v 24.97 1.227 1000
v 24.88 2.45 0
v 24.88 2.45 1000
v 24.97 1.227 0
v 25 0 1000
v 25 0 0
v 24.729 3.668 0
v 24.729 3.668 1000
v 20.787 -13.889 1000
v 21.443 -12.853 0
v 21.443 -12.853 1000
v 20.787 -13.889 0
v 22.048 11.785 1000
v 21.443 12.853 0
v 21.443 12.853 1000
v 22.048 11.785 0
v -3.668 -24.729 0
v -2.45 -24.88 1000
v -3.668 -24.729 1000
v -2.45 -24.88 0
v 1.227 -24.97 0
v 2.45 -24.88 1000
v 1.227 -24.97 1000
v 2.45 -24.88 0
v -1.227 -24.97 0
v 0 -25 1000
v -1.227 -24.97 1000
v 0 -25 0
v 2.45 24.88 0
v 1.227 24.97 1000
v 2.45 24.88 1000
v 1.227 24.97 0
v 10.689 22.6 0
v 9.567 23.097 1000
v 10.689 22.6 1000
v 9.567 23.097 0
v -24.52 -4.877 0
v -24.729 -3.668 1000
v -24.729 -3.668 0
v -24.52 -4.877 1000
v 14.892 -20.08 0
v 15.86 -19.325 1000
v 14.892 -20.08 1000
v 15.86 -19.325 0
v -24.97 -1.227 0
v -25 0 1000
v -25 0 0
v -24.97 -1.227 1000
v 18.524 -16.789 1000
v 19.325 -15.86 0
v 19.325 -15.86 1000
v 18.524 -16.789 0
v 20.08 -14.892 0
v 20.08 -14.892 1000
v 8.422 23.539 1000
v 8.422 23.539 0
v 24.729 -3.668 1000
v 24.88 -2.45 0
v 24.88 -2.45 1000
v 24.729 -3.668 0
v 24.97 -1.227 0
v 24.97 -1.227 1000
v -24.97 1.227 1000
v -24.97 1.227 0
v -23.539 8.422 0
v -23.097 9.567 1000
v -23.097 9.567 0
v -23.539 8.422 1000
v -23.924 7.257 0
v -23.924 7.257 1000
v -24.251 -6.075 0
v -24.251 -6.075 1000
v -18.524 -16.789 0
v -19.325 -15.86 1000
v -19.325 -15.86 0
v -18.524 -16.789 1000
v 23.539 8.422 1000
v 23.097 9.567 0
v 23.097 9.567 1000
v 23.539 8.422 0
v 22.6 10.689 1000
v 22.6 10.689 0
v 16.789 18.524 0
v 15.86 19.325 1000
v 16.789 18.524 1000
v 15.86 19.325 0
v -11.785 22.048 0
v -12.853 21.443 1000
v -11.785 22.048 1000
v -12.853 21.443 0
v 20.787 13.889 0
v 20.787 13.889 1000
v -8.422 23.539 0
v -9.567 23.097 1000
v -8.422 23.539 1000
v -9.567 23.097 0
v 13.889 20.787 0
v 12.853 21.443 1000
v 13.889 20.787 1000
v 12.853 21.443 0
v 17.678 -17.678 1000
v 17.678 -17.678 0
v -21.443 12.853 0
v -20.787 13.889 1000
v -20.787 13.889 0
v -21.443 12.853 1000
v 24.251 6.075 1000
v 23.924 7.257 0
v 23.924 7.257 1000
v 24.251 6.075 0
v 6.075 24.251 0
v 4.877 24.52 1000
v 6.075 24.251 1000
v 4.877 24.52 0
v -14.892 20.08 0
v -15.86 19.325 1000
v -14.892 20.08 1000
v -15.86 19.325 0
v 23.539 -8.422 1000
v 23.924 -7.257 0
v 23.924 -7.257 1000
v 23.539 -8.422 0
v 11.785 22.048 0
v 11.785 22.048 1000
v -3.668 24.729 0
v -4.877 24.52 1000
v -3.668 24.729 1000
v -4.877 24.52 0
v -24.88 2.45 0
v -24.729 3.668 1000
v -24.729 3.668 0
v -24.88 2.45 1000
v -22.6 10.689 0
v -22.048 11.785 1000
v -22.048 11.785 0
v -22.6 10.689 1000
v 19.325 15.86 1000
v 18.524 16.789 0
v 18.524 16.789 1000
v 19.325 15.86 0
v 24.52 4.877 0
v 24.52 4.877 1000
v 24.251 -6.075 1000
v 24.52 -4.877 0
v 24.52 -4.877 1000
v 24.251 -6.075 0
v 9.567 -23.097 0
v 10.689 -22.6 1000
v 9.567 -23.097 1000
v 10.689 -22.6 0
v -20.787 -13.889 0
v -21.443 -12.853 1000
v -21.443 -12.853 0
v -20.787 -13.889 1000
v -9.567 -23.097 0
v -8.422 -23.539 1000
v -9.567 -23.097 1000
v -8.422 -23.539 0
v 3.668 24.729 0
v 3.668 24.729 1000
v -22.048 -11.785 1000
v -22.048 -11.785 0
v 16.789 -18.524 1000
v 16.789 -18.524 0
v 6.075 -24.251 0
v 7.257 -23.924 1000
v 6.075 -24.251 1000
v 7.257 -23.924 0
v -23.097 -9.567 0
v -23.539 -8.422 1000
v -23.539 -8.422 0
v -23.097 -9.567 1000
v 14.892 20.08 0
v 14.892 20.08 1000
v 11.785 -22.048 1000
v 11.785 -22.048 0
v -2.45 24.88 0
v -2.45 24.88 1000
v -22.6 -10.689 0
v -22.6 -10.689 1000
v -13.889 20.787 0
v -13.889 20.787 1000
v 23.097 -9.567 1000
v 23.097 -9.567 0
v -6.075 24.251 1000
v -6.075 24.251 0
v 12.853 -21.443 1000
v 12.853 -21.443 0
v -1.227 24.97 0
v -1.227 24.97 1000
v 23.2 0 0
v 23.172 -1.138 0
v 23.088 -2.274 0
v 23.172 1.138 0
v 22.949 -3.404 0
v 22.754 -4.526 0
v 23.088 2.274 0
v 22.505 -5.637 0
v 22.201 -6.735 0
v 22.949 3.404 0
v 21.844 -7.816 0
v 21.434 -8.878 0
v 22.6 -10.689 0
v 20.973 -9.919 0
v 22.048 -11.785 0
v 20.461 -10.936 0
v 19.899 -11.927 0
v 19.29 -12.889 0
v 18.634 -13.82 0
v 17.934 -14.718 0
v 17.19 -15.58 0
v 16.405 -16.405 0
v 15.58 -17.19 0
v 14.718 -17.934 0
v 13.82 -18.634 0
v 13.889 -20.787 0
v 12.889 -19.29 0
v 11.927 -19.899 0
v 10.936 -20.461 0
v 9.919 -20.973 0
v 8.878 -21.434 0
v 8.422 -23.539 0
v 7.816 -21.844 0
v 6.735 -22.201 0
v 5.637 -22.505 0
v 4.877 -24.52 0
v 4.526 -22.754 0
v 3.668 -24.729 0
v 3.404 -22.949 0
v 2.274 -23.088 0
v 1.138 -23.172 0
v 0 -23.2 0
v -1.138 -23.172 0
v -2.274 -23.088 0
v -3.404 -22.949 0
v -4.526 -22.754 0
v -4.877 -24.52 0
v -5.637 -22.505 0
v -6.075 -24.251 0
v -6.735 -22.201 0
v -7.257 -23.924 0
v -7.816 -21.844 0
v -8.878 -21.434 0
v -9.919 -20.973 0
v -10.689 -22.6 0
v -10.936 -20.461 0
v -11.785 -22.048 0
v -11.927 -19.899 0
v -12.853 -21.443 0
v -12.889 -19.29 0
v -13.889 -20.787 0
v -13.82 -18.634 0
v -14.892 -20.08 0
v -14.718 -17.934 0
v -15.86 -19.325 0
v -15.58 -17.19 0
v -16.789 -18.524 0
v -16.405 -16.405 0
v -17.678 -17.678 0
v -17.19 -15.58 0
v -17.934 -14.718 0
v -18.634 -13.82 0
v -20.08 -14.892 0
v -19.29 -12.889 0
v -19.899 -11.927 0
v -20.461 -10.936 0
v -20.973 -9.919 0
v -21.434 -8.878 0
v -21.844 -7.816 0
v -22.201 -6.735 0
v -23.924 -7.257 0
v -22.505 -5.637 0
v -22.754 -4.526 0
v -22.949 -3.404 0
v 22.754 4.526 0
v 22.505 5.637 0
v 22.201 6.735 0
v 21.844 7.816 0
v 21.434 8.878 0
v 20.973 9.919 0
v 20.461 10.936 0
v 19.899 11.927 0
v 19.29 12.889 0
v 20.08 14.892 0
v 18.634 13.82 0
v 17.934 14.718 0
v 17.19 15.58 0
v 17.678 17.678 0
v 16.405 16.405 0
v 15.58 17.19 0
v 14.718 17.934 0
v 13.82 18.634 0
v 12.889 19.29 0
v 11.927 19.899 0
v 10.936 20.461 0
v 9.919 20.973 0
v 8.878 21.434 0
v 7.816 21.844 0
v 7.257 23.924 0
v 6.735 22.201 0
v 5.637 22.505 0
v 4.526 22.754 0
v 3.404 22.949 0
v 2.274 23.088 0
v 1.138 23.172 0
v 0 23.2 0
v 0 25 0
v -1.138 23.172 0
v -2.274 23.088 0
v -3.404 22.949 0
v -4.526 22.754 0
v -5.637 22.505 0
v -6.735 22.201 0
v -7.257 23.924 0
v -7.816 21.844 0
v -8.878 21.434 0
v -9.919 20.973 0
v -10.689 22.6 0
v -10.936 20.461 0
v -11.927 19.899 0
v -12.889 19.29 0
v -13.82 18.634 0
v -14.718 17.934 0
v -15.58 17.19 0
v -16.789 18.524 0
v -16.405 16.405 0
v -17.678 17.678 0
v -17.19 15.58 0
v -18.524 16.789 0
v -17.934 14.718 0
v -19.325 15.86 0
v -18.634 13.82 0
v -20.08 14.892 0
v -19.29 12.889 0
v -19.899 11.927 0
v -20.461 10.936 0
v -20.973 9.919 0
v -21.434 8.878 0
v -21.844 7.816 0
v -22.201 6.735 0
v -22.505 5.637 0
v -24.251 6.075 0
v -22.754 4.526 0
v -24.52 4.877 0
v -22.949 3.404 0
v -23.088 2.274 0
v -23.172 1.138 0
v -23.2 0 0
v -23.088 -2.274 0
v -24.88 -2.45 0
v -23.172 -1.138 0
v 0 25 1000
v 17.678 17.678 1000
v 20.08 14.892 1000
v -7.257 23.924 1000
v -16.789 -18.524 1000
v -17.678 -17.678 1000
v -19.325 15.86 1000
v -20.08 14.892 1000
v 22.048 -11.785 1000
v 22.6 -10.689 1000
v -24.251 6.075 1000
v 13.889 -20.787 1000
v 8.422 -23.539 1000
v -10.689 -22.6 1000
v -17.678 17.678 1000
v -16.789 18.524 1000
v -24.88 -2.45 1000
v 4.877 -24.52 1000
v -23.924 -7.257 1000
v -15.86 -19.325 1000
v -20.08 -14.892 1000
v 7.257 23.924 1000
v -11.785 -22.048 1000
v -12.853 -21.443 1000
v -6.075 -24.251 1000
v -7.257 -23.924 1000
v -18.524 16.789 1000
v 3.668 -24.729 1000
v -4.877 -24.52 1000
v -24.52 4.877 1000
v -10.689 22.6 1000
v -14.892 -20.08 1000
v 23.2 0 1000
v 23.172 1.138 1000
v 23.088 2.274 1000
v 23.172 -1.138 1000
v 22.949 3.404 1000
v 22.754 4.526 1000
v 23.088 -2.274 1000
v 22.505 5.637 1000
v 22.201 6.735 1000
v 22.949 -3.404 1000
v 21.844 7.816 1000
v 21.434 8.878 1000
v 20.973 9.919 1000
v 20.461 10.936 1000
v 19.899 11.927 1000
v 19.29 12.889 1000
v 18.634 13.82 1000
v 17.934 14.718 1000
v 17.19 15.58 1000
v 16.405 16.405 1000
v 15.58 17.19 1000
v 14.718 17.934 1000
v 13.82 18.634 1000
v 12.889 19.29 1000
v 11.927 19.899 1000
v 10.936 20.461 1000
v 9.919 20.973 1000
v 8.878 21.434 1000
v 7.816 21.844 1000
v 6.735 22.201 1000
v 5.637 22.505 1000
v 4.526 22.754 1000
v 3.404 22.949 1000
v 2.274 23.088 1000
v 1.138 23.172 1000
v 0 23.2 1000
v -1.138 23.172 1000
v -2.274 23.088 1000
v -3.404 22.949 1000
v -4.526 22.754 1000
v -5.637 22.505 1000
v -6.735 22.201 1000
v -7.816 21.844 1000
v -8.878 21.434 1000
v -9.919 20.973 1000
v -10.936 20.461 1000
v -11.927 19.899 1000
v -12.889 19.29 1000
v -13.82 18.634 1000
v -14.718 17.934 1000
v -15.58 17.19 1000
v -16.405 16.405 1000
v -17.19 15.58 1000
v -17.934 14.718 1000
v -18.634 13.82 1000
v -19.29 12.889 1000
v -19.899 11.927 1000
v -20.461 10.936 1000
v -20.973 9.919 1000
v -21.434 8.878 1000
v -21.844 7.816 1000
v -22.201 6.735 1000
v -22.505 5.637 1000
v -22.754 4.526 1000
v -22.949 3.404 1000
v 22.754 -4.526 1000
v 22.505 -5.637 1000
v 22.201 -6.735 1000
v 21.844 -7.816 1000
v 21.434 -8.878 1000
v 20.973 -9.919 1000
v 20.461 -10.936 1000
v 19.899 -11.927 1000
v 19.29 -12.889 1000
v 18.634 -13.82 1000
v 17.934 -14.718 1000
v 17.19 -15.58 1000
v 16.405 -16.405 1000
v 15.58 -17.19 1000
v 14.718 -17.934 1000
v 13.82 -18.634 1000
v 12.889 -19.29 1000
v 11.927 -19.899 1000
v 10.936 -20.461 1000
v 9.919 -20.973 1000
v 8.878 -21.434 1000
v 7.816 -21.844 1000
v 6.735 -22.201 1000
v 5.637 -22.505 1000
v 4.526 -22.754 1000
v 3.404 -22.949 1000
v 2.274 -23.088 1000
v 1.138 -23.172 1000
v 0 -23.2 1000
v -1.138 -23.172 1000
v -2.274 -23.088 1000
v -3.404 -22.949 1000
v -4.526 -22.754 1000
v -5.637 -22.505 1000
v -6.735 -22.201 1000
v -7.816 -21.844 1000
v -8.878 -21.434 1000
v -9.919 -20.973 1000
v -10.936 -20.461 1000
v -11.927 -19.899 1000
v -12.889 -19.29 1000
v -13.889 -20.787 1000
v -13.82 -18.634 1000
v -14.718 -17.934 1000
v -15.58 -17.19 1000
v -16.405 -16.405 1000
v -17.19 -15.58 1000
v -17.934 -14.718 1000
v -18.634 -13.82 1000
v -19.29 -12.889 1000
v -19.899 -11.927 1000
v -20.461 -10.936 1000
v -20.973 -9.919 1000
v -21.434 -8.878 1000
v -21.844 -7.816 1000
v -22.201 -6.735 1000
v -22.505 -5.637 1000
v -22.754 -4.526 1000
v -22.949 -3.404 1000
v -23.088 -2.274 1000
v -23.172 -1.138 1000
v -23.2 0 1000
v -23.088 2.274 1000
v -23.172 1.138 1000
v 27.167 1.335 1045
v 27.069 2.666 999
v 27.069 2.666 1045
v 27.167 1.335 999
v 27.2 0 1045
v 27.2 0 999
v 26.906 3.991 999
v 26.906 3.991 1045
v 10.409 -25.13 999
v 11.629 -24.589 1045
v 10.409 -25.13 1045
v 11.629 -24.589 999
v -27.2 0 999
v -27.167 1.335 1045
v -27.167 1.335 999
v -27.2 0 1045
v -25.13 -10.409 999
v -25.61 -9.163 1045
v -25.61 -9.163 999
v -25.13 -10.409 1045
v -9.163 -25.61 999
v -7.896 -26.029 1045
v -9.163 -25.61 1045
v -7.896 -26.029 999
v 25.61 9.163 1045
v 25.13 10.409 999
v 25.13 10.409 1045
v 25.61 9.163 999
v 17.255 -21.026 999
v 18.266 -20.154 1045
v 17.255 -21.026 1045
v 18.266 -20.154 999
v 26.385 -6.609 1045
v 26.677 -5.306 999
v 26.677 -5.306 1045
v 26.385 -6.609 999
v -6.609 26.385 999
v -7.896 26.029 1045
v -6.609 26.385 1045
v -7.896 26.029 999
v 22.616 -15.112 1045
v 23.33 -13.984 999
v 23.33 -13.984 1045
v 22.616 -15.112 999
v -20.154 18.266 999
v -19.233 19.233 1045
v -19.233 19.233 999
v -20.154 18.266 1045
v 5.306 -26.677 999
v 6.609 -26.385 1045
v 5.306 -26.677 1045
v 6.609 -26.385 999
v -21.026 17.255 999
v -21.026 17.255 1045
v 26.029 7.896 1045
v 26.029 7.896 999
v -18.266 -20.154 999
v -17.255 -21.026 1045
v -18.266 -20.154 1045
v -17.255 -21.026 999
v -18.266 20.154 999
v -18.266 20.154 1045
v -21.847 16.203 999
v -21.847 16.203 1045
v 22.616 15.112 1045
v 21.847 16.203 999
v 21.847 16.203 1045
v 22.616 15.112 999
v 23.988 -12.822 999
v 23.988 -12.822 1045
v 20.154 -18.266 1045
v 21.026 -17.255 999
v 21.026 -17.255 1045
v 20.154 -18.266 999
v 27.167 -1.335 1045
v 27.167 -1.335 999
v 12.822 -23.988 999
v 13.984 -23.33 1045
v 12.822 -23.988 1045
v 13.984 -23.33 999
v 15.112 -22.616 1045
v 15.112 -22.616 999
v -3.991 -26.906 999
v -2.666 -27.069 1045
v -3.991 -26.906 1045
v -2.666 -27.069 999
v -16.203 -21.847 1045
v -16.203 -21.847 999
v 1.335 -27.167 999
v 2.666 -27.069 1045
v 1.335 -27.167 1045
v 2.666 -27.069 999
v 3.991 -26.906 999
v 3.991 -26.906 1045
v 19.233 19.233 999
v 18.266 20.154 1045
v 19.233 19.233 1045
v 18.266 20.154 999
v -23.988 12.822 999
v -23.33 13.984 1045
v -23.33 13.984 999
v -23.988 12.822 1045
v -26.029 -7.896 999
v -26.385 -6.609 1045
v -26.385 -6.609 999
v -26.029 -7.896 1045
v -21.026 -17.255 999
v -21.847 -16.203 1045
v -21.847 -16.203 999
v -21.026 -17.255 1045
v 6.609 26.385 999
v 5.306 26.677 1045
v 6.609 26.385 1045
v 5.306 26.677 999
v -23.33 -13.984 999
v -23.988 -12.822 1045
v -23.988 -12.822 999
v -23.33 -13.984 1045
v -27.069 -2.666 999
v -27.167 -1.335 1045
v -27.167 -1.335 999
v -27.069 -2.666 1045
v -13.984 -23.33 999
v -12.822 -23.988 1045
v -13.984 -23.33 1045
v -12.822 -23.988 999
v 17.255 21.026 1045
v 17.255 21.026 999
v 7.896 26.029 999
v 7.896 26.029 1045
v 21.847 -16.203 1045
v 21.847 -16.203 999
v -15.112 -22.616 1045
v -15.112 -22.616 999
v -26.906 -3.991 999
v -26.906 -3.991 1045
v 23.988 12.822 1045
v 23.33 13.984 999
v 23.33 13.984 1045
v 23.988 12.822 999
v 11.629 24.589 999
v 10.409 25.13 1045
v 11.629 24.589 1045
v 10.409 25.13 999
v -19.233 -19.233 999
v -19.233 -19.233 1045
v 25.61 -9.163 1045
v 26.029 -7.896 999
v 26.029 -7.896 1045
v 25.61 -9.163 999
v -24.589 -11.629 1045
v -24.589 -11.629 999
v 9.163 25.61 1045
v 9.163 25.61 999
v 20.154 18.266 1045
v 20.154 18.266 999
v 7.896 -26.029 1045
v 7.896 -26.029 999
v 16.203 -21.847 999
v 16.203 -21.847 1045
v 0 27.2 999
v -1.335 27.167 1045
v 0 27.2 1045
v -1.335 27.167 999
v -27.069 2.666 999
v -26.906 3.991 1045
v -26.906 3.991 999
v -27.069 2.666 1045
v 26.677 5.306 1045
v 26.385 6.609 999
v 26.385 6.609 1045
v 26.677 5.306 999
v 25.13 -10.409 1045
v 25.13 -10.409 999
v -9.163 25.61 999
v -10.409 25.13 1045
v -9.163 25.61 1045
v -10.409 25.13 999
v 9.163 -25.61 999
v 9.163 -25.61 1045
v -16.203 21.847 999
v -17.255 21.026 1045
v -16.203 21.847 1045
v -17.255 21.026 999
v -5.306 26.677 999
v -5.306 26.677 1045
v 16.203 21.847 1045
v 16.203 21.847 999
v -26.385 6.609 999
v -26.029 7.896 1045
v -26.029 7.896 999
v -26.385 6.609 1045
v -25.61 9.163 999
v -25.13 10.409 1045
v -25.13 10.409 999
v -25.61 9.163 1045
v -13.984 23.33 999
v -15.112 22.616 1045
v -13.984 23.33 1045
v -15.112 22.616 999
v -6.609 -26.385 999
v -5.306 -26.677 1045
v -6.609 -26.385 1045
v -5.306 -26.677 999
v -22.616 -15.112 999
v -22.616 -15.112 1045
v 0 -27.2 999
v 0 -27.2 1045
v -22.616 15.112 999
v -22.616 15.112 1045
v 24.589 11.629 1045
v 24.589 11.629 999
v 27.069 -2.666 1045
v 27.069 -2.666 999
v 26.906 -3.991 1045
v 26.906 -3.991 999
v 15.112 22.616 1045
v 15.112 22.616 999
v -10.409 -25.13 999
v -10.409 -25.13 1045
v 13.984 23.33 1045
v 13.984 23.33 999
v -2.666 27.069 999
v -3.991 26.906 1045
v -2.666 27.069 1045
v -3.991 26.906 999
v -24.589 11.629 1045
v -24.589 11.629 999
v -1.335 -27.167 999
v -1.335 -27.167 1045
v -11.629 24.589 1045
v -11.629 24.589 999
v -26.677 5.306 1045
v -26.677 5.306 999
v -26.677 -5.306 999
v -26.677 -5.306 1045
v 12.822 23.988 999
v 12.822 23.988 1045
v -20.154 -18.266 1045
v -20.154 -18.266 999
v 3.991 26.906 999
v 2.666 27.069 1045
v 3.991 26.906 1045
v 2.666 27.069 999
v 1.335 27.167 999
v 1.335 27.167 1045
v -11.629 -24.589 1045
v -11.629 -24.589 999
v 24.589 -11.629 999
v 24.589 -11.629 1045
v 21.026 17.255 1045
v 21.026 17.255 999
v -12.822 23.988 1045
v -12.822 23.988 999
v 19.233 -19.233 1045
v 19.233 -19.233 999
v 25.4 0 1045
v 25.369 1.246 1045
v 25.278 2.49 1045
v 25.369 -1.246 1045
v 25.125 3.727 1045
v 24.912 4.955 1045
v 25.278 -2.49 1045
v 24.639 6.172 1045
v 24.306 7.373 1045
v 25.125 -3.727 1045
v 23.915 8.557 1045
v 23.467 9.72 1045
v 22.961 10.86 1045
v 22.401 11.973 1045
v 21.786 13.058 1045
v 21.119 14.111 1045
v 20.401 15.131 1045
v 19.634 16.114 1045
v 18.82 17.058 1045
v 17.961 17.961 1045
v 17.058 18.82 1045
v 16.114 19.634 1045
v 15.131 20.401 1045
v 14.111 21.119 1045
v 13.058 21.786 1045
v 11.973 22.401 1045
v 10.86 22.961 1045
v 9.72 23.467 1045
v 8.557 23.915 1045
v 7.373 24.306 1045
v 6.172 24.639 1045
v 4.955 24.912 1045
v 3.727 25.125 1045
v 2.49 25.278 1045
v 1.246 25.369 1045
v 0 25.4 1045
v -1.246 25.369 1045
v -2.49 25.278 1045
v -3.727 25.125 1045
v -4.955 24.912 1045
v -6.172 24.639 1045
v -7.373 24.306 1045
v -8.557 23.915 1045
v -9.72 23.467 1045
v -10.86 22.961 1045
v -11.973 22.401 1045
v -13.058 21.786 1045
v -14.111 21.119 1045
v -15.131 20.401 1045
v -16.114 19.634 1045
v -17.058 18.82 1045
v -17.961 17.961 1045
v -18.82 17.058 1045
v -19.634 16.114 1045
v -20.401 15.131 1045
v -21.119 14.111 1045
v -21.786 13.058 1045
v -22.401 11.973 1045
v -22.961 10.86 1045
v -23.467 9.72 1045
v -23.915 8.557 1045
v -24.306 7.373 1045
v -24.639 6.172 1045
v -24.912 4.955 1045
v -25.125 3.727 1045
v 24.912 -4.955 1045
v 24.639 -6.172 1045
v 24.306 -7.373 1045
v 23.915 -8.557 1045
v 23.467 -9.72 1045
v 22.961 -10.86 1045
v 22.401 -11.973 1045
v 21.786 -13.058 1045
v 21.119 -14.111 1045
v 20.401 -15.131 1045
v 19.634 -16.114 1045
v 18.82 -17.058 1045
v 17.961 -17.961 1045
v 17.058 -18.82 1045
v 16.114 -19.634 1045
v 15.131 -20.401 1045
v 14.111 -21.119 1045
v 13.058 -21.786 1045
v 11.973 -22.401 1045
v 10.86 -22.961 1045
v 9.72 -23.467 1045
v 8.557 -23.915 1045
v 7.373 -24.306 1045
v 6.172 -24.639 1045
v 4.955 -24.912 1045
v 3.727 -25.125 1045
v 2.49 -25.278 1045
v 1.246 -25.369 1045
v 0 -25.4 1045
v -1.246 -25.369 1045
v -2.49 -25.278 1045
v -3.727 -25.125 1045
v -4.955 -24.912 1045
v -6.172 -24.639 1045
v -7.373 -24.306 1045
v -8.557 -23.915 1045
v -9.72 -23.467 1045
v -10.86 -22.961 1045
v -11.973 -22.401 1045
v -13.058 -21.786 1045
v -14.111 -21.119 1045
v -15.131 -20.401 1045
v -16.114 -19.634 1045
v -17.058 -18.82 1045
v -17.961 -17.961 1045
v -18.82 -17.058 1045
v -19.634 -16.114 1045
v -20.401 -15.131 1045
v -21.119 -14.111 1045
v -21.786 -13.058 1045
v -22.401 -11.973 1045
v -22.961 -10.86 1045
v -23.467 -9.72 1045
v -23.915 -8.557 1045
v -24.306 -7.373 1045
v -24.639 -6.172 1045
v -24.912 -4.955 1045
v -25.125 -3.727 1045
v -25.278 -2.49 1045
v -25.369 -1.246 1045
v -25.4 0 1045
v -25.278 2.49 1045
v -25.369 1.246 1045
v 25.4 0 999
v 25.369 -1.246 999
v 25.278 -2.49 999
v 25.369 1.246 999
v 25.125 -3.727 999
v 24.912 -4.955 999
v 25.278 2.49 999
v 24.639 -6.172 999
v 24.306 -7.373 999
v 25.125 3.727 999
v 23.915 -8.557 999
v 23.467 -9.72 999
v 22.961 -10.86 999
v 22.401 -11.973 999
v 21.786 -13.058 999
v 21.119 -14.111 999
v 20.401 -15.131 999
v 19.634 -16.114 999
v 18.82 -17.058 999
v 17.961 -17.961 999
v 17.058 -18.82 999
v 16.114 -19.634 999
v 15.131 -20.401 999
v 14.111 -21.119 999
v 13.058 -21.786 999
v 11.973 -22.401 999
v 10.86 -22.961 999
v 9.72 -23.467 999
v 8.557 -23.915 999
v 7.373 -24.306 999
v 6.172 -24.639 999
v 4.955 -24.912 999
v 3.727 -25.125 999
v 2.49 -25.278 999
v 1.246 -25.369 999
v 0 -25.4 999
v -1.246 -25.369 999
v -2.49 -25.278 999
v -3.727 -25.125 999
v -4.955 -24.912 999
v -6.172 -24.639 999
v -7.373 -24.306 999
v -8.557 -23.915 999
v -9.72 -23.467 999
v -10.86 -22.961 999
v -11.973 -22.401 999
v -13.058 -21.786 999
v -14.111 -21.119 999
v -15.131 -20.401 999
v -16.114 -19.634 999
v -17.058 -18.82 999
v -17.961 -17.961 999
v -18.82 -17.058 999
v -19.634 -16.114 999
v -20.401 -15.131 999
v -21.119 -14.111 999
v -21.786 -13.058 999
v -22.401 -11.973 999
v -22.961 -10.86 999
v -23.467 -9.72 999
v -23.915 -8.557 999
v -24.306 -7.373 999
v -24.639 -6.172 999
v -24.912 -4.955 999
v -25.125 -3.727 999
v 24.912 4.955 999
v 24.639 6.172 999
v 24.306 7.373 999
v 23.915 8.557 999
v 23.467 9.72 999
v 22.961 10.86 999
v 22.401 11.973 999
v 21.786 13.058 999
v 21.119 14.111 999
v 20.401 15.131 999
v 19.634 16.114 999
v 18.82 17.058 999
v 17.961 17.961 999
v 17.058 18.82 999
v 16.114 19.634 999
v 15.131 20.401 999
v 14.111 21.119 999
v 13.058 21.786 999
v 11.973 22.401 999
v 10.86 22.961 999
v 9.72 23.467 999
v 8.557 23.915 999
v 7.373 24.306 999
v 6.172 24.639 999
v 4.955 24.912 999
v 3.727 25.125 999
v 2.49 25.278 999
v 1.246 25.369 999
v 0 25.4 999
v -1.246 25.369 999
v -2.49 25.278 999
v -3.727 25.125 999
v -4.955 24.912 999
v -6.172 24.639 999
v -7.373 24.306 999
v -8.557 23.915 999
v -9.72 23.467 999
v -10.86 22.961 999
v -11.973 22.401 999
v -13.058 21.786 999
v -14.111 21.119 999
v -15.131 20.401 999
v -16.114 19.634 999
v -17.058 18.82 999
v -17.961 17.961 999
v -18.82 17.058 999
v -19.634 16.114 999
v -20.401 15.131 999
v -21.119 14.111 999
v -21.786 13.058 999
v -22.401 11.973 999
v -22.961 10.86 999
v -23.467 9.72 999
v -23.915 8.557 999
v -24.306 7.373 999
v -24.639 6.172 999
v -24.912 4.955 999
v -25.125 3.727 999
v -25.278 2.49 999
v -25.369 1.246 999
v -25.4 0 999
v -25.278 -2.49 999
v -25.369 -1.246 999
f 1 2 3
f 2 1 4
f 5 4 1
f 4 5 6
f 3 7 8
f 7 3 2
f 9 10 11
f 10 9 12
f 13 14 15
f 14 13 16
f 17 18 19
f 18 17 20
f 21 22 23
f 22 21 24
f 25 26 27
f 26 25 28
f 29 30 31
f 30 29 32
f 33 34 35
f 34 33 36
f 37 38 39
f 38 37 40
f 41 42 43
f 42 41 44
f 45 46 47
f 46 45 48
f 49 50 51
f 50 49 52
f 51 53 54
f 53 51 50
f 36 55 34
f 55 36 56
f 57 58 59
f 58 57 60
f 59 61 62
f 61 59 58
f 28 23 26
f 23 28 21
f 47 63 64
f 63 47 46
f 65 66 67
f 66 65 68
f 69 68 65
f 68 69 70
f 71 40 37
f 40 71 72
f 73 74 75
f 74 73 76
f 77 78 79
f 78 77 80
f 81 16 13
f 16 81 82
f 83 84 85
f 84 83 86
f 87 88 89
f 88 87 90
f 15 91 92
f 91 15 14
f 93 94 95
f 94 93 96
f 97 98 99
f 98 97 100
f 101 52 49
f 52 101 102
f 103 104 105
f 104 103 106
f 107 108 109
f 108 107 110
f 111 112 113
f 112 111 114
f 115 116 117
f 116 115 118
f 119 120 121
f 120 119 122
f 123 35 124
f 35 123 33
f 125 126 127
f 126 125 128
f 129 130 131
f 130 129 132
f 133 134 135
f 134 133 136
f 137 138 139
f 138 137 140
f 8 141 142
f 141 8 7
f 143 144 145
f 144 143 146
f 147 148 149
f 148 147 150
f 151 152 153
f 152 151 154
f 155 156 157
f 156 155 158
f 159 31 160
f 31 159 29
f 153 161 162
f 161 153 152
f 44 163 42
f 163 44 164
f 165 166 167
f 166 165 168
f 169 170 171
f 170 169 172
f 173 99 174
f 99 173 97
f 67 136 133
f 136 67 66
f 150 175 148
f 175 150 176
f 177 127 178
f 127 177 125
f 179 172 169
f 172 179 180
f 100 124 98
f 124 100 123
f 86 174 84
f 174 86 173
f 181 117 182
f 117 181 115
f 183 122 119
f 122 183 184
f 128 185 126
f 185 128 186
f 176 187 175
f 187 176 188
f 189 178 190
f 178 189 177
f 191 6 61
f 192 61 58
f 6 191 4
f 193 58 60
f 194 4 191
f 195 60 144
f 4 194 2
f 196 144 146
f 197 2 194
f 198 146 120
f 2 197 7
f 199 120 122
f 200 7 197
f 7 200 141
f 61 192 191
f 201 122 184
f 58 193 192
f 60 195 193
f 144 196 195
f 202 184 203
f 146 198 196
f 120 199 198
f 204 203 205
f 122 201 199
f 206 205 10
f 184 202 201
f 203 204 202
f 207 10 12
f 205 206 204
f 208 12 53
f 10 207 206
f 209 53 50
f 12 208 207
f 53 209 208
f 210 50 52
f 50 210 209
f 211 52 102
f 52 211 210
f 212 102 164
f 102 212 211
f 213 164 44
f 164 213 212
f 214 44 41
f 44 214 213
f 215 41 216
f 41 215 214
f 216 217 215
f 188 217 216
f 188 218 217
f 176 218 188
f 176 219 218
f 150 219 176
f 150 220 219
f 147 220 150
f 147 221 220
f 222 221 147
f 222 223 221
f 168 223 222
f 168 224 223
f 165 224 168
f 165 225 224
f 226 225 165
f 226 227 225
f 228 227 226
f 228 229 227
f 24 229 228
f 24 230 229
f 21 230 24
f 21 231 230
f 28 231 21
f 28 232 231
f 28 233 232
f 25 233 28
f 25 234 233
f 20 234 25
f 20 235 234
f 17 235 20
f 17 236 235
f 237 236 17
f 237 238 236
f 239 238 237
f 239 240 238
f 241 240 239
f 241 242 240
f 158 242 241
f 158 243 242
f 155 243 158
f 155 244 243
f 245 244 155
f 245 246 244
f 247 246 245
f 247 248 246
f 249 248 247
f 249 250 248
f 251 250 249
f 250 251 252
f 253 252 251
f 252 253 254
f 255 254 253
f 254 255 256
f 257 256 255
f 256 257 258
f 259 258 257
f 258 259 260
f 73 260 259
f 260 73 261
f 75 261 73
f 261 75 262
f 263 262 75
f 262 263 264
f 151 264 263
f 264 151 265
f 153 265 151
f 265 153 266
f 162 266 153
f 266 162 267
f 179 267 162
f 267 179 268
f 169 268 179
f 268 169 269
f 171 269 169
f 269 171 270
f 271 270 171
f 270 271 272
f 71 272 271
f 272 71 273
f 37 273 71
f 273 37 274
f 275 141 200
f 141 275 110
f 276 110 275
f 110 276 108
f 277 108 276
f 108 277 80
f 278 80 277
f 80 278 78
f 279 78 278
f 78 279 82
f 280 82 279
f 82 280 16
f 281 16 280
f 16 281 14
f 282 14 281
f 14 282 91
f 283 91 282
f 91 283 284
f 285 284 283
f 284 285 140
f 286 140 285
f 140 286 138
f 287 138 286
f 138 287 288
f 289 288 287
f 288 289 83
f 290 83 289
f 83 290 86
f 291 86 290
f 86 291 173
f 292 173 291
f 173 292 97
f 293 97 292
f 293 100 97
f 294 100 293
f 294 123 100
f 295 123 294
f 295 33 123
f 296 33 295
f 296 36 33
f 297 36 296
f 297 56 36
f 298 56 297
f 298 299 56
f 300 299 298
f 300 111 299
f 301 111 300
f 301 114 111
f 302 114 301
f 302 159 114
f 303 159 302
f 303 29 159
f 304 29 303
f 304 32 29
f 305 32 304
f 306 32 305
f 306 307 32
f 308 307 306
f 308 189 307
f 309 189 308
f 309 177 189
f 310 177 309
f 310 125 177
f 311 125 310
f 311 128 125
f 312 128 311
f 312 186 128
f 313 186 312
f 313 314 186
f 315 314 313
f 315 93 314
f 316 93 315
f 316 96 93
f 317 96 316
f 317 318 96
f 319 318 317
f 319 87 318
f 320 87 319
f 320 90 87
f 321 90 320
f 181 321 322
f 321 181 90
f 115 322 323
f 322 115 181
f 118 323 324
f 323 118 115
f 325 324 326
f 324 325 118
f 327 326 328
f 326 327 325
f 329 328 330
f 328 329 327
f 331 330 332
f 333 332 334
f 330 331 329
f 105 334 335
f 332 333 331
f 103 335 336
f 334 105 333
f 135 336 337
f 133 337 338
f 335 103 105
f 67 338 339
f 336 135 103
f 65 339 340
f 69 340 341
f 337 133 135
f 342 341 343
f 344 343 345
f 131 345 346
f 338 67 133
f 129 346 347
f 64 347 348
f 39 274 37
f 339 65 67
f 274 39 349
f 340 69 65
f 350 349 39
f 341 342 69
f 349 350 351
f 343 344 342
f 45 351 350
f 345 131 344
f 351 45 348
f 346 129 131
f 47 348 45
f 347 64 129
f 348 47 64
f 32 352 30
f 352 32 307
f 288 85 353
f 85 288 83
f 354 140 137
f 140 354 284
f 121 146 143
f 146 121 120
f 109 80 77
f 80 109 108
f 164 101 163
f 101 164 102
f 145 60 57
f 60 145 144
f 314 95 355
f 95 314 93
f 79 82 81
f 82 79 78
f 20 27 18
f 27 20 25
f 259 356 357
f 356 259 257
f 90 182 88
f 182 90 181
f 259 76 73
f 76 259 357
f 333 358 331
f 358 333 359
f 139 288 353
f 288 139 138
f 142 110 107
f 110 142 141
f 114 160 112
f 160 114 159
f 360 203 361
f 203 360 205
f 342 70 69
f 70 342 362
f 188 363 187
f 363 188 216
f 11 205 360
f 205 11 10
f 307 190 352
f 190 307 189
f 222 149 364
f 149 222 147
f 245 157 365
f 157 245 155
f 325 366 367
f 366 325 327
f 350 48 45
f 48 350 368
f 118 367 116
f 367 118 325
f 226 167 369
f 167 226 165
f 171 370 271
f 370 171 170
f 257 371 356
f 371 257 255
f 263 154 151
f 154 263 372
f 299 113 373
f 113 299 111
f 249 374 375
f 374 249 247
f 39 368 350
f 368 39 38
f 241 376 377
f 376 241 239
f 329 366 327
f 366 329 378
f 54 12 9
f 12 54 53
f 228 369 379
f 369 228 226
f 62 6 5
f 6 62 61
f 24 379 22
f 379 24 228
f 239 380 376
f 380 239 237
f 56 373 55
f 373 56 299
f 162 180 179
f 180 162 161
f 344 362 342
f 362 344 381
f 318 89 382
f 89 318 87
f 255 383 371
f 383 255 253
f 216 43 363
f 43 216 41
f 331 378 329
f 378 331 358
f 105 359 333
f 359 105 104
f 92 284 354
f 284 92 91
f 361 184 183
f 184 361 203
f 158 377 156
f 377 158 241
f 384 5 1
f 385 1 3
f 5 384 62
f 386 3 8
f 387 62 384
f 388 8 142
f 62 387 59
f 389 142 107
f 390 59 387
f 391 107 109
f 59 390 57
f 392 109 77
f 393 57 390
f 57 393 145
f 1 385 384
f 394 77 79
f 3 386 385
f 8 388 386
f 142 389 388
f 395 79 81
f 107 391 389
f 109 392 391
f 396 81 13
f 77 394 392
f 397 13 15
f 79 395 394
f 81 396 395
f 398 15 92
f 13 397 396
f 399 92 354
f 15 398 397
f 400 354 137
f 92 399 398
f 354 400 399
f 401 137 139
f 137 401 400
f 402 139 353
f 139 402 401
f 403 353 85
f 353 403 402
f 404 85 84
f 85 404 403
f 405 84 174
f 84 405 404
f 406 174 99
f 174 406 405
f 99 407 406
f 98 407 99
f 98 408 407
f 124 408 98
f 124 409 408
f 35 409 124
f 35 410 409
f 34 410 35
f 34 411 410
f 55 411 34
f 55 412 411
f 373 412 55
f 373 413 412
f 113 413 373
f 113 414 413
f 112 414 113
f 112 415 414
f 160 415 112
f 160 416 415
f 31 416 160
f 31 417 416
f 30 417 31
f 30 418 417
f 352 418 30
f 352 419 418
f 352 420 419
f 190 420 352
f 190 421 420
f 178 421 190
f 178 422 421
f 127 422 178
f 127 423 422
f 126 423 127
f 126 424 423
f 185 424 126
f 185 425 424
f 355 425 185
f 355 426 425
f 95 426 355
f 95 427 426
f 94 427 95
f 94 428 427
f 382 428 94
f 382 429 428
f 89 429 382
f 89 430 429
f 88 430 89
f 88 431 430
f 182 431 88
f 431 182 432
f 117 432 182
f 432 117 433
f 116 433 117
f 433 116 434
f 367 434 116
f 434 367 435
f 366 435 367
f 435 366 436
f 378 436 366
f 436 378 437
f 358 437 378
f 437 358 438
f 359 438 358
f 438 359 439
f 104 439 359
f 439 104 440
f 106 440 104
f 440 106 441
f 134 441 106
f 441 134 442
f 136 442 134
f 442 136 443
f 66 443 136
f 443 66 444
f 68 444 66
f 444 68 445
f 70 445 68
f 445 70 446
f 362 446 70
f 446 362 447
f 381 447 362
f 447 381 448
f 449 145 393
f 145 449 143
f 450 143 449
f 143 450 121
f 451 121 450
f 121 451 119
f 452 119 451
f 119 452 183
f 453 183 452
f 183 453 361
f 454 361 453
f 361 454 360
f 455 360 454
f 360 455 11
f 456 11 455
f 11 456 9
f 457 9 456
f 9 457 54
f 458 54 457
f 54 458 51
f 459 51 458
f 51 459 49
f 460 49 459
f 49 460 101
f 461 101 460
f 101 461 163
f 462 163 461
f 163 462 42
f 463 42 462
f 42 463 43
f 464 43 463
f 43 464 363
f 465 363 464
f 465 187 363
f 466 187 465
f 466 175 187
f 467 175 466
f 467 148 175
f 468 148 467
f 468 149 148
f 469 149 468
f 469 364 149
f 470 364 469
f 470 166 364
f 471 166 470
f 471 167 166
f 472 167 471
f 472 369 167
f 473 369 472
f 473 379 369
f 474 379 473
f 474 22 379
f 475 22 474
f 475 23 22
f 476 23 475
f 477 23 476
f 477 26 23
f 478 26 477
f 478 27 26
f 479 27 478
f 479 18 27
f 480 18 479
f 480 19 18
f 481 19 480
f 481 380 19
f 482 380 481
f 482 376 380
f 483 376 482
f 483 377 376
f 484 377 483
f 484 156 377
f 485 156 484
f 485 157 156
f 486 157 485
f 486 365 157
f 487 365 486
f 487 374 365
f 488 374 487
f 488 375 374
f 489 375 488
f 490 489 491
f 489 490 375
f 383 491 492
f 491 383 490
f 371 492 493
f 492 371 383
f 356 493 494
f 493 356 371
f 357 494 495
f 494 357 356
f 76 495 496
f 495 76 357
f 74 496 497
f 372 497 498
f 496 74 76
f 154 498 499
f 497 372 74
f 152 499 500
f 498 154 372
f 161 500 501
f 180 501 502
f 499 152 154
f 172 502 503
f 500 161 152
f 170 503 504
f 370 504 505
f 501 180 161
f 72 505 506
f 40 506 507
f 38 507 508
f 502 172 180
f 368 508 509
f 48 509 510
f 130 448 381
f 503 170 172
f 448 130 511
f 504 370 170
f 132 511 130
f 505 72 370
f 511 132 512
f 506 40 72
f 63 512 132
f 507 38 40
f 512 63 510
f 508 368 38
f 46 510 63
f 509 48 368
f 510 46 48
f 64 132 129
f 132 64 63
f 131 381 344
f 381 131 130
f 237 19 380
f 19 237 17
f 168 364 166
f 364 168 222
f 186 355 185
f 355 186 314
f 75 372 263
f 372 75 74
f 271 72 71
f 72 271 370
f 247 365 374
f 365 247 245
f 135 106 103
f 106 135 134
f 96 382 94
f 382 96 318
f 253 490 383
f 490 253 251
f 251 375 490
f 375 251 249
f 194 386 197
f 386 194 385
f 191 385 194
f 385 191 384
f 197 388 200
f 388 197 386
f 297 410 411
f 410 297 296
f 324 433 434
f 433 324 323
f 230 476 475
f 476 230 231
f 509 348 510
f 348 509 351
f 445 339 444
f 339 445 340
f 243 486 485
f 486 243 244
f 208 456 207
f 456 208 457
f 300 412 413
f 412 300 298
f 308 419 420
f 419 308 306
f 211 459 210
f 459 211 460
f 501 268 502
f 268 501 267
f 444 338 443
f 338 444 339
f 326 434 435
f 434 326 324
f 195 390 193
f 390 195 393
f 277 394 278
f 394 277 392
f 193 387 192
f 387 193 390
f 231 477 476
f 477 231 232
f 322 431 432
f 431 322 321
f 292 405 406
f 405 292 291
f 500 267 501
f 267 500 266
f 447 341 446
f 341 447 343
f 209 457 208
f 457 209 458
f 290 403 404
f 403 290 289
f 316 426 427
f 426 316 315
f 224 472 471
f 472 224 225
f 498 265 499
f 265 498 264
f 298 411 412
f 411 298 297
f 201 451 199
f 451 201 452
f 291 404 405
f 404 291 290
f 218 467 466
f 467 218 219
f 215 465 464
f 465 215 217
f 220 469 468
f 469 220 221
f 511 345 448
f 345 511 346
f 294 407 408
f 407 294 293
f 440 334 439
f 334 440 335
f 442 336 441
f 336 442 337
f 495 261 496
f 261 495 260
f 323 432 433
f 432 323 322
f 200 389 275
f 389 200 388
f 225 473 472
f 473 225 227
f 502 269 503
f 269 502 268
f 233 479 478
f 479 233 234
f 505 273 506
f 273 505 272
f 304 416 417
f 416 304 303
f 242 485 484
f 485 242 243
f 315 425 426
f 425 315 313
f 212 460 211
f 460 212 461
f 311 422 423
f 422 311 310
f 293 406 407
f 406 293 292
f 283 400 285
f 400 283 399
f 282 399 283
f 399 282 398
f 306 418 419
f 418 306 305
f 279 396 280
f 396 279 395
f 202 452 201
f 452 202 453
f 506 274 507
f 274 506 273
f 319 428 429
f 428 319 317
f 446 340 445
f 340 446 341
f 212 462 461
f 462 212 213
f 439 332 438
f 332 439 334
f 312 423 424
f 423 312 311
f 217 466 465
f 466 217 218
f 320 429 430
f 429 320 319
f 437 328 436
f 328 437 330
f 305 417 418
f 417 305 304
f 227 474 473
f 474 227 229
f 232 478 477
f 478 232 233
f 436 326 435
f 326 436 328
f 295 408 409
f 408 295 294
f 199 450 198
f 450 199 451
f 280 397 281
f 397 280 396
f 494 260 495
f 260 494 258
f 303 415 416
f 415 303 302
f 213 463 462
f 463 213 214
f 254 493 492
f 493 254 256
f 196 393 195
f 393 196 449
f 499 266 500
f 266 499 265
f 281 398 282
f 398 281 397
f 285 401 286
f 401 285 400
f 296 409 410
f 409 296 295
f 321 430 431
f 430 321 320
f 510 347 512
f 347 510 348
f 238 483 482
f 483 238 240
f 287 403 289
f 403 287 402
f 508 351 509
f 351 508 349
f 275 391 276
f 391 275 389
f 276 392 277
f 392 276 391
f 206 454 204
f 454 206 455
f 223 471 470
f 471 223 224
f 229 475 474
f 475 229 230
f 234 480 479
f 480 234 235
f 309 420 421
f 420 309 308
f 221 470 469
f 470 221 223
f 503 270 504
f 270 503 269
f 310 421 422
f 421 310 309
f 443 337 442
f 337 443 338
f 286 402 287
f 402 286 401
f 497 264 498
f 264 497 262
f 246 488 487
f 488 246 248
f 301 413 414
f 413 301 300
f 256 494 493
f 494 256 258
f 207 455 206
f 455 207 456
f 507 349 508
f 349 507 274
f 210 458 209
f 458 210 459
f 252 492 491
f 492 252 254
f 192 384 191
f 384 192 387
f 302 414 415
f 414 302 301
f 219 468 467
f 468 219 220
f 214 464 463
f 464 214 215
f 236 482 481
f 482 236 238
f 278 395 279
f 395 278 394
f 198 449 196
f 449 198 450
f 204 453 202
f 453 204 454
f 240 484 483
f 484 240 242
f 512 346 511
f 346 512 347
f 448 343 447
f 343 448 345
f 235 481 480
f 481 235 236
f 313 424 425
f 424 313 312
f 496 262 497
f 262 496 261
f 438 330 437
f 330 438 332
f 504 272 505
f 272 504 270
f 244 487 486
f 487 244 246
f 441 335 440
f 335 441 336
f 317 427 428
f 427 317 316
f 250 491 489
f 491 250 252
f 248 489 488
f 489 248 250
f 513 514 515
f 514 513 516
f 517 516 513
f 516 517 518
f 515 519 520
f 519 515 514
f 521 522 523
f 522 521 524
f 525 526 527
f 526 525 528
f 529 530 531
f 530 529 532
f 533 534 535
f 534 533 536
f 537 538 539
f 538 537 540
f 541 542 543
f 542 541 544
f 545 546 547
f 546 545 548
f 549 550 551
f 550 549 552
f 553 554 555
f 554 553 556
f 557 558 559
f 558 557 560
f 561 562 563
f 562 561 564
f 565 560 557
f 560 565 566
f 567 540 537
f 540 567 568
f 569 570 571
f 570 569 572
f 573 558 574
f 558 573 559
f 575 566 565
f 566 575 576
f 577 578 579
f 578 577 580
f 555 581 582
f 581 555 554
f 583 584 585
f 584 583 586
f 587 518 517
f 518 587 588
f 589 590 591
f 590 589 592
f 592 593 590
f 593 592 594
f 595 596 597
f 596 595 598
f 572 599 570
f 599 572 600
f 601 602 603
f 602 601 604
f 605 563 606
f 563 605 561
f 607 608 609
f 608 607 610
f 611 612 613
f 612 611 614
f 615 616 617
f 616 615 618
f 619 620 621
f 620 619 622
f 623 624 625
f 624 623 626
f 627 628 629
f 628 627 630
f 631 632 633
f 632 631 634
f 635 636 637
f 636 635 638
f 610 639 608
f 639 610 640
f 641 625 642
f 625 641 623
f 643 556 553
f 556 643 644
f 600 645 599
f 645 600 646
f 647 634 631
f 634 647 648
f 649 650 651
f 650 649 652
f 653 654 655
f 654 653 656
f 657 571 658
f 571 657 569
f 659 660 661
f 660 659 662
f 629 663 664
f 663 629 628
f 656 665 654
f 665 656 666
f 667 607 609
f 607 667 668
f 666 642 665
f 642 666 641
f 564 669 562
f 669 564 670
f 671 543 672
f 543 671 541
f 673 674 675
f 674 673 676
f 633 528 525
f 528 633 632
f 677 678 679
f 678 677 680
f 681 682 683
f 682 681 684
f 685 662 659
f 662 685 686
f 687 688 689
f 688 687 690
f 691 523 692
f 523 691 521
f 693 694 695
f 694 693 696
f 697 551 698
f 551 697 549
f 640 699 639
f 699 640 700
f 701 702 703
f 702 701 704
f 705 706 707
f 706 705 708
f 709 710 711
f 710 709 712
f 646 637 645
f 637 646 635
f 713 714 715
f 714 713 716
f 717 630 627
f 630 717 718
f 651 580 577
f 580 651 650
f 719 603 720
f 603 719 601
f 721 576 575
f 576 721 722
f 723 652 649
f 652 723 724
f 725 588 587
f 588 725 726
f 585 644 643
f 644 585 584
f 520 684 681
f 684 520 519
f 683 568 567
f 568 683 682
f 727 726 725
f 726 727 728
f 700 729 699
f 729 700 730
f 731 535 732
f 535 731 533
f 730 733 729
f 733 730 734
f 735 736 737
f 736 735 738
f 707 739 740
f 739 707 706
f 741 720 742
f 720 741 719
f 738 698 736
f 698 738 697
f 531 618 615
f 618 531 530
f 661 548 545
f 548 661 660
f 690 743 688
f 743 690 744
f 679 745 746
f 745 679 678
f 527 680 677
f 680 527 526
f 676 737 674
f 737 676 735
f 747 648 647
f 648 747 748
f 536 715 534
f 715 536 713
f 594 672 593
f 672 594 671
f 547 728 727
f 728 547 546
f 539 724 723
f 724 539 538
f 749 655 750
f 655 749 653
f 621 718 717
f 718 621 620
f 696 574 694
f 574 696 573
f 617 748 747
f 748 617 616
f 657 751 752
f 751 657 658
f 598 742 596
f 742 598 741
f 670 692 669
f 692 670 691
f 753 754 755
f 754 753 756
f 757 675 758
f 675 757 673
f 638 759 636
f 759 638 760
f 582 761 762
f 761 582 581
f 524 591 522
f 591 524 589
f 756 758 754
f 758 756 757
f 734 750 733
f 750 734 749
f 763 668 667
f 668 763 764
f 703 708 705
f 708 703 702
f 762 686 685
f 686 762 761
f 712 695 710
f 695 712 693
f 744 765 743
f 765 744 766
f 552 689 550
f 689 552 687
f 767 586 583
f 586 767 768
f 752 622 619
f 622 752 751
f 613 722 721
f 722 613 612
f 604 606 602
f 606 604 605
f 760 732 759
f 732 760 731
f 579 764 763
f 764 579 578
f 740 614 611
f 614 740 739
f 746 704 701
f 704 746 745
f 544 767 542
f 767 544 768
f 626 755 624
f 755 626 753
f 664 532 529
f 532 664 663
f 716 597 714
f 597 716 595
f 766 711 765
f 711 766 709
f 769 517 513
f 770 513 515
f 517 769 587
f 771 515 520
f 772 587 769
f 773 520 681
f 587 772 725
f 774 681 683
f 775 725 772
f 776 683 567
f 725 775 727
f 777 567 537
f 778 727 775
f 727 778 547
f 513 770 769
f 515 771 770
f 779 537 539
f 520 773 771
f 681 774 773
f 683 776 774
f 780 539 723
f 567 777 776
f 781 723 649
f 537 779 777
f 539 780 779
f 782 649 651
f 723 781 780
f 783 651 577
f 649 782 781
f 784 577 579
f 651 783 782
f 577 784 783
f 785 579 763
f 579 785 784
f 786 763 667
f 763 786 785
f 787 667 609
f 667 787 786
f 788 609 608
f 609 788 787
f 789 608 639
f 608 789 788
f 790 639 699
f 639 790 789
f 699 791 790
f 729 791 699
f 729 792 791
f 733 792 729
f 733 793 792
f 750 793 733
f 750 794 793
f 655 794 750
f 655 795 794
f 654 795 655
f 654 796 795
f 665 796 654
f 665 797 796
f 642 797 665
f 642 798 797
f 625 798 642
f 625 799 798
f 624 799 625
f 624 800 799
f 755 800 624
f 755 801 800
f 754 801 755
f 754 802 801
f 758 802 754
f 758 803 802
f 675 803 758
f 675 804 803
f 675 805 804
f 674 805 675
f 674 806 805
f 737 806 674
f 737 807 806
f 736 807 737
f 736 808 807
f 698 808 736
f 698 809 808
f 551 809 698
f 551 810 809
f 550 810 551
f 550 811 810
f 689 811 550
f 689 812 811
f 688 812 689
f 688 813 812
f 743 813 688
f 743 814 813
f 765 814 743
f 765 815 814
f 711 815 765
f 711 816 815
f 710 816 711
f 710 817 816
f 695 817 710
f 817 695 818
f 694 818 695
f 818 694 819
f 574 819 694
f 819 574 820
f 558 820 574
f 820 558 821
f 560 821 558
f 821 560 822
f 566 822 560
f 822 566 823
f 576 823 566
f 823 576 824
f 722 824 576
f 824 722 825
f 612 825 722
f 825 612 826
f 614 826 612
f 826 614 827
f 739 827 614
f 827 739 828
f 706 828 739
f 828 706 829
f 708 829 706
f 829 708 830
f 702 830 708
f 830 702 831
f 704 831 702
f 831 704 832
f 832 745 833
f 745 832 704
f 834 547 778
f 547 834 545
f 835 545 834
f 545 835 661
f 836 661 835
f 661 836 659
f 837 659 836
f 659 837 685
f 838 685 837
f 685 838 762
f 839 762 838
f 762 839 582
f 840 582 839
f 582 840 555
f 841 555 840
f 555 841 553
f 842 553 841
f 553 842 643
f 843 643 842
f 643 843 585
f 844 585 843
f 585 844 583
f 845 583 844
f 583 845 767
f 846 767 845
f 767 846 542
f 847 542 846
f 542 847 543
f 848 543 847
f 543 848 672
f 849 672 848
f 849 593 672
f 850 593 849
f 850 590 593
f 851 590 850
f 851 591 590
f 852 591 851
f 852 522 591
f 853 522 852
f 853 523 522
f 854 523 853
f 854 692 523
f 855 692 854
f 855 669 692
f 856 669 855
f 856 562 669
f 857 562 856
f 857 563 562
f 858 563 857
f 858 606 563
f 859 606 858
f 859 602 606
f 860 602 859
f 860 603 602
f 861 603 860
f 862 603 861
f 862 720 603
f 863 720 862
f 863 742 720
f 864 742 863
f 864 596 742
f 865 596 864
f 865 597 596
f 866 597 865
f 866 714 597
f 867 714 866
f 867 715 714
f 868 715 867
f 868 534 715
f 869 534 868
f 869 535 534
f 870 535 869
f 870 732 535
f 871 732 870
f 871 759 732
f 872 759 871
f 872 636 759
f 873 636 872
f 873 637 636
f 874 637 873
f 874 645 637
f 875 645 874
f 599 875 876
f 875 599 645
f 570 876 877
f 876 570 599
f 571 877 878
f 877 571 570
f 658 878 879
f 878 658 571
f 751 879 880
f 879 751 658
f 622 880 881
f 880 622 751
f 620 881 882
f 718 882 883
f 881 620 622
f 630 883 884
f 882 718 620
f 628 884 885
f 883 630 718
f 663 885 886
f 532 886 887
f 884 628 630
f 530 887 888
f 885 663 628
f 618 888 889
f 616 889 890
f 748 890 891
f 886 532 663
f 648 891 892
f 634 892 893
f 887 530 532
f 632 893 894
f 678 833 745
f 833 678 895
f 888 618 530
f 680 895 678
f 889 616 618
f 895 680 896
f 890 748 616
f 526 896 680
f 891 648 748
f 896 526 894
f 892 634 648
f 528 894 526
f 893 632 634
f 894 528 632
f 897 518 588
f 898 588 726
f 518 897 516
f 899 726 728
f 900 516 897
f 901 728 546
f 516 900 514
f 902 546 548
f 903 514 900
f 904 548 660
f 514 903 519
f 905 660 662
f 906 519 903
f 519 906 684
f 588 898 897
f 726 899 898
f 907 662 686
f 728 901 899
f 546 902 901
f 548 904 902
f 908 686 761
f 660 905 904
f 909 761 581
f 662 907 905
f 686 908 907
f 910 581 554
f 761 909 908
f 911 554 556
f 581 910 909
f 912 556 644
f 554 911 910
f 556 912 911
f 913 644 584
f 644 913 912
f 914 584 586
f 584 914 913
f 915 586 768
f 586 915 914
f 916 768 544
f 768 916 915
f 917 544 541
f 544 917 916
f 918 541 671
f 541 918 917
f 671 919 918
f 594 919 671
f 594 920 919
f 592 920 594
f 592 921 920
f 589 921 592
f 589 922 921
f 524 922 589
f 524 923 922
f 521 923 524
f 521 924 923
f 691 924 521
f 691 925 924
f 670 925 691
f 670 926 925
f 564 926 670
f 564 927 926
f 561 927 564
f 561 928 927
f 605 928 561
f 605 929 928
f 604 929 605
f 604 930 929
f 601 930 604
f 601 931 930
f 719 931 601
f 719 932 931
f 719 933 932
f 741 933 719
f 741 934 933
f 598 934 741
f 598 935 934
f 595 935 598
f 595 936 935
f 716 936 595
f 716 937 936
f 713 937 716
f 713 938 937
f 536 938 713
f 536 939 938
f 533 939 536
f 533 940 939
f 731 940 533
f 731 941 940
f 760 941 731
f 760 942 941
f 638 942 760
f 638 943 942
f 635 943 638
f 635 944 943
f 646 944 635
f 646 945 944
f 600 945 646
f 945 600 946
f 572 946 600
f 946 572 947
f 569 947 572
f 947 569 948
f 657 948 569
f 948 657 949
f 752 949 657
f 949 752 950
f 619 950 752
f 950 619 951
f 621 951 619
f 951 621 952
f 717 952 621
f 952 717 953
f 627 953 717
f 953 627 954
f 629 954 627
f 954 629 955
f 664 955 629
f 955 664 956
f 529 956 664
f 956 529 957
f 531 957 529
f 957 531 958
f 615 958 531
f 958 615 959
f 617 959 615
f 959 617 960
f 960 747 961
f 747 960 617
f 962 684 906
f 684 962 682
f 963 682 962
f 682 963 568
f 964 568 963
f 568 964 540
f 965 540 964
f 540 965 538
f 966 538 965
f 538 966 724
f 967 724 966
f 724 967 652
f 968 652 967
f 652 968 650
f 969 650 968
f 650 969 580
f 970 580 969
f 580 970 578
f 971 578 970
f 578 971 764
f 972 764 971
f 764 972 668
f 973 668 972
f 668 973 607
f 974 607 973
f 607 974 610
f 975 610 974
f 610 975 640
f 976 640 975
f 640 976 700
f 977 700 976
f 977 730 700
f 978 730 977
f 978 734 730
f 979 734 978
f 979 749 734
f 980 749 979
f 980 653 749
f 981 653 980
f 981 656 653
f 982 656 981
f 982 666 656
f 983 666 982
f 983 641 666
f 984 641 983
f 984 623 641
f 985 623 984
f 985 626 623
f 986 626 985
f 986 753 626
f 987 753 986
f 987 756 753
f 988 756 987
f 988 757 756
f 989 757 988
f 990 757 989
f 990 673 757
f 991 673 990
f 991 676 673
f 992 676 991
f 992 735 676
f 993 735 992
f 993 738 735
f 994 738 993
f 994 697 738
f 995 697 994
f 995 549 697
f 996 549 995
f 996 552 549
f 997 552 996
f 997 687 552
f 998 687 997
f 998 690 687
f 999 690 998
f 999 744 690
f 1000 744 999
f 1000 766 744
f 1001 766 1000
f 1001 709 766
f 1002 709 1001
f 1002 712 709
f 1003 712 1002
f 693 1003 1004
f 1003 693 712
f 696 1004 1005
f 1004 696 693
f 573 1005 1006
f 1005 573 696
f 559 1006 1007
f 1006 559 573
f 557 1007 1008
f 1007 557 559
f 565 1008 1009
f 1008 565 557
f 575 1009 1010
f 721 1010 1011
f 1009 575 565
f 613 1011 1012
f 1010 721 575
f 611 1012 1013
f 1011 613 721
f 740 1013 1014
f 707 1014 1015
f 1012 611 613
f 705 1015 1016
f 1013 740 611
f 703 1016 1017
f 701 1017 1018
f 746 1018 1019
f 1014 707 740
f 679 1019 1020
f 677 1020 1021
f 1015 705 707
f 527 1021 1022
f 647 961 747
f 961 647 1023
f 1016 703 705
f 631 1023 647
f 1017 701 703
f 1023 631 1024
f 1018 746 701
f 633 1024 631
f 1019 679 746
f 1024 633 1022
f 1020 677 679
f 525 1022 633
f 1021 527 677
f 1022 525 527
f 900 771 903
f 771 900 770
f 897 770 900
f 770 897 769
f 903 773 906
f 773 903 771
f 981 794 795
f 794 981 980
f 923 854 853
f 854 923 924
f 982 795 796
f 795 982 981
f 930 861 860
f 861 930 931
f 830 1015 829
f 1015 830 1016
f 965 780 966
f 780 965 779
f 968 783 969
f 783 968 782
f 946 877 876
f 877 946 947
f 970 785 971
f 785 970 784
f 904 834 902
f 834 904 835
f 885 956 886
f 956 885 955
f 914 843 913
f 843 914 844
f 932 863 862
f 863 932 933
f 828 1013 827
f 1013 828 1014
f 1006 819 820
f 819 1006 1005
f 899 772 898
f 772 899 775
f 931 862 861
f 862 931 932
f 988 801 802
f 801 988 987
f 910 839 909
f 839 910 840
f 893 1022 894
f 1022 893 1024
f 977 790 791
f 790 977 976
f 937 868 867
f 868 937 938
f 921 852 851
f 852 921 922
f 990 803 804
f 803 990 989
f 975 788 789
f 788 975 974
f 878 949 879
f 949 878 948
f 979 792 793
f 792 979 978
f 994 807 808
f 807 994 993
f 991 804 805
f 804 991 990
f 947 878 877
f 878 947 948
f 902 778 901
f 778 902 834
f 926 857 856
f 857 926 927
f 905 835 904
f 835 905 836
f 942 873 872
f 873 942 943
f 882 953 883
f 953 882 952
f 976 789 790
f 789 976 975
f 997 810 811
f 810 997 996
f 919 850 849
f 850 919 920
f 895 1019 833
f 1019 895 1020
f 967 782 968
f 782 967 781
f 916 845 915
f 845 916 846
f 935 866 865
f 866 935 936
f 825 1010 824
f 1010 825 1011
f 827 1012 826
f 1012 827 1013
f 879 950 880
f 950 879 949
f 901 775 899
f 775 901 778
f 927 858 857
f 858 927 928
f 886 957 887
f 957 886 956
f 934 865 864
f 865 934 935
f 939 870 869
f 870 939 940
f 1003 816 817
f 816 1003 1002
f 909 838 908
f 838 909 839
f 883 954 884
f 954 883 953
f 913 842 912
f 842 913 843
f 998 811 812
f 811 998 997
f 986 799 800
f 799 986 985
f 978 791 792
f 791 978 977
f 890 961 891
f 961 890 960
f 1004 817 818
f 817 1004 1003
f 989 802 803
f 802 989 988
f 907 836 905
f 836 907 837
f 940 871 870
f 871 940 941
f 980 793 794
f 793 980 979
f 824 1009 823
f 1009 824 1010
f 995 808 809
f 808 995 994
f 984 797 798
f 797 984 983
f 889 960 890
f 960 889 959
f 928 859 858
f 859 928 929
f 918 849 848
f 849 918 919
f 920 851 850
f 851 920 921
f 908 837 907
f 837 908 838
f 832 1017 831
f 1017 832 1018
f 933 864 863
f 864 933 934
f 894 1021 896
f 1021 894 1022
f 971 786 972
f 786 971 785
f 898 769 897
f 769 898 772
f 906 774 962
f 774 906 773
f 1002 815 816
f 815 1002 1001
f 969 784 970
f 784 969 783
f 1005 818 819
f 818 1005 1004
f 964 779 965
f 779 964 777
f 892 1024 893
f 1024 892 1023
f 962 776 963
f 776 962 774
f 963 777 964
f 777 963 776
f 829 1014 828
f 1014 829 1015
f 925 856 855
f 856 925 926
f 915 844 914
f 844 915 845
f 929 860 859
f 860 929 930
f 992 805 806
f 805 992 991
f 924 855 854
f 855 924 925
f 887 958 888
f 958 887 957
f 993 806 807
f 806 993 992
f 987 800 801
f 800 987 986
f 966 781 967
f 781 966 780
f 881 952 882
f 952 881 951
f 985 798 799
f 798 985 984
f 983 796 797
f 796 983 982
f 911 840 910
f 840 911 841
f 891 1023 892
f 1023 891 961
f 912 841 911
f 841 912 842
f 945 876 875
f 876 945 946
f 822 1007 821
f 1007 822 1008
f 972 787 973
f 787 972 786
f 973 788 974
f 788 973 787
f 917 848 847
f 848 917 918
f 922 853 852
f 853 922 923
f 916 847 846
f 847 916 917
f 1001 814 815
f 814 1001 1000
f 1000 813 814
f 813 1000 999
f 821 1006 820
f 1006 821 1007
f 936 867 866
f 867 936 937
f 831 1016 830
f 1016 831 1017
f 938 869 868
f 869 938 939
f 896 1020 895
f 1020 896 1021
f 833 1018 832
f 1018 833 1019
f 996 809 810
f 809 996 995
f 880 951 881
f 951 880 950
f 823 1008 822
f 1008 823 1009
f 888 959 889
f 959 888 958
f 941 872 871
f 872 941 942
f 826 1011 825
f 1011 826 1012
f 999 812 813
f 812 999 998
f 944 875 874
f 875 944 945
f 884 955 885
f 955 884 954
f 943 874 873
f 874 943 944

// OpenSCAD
// HT 50 pipe 1000 mm (with optional socket end)
// All dimensions in mm

$fn = 128;

// Parameters
length_mm = 1000; //[500:2000:10]
ht50_outer_diameter_mm = 50; //[40:100:1]
ht50_wall_thickness_mm = 1.8; //[1:4:0.1]
include_socket_end = 1; //[0:1:1]
socket_length_mm = 45; //[25:90:1]
socket_wall_extra_mm = 2.2; //[1:6:0.1]
socket_clearance_mm = 0.4; //[0.1:1.5:0.1]
overlap_mm = 1; //[0.5:2:0.1]

// Derived
outer_r = ht50_outer_diameter_mm/2;
inner_r = outer_r - ht50_wall_thickness_mm;
socket_outer_r = outer_r + socket_wall_extra_mm;
socket_inner_r = outer_r + socket_clearance_mm;

// Safety
inner_r_safe = max(0.01, inner_r);
socket_inner_r_safe = max(0.01, socket_inner_r);

// Main pipe (hollow)
module ht_pipe() {
  difference() {
    cylinder(h=length_mm, r=outer_r, center=false);
    translate([0, 0, -overlap_mm])
      cylinder(h=length_mm + 2*overlap_mm, r=inner_r_safe, center=false);
  }
}

// Socket end (hollow sleeve) connected to pipe end with overlap
module socket_end_fitting() {
  // Place socket so it starts slightly before pipe end to guarantee connection
  socket_z0 = length_mm - overlap_mm; // start position (z) of socket outer
  difference() {
    translate([0, 0, socket_z0])
      cylinder(h=socket_length_mm + overlap_mm, r=socket_outer_r, center=false);
    translate([0, 0, socket_z0 - overlap_mm])
      cylinder(h=socket_length_mm + 3*overlap_mm, r=socket_inner_r_safe, center=false);
  }
}

// Assembly: one connected solid
color([0.85, 0.85, 0.8])
union() {
  ht_pipe();
  if (include_socket_end) socket_end_fitting();
}
